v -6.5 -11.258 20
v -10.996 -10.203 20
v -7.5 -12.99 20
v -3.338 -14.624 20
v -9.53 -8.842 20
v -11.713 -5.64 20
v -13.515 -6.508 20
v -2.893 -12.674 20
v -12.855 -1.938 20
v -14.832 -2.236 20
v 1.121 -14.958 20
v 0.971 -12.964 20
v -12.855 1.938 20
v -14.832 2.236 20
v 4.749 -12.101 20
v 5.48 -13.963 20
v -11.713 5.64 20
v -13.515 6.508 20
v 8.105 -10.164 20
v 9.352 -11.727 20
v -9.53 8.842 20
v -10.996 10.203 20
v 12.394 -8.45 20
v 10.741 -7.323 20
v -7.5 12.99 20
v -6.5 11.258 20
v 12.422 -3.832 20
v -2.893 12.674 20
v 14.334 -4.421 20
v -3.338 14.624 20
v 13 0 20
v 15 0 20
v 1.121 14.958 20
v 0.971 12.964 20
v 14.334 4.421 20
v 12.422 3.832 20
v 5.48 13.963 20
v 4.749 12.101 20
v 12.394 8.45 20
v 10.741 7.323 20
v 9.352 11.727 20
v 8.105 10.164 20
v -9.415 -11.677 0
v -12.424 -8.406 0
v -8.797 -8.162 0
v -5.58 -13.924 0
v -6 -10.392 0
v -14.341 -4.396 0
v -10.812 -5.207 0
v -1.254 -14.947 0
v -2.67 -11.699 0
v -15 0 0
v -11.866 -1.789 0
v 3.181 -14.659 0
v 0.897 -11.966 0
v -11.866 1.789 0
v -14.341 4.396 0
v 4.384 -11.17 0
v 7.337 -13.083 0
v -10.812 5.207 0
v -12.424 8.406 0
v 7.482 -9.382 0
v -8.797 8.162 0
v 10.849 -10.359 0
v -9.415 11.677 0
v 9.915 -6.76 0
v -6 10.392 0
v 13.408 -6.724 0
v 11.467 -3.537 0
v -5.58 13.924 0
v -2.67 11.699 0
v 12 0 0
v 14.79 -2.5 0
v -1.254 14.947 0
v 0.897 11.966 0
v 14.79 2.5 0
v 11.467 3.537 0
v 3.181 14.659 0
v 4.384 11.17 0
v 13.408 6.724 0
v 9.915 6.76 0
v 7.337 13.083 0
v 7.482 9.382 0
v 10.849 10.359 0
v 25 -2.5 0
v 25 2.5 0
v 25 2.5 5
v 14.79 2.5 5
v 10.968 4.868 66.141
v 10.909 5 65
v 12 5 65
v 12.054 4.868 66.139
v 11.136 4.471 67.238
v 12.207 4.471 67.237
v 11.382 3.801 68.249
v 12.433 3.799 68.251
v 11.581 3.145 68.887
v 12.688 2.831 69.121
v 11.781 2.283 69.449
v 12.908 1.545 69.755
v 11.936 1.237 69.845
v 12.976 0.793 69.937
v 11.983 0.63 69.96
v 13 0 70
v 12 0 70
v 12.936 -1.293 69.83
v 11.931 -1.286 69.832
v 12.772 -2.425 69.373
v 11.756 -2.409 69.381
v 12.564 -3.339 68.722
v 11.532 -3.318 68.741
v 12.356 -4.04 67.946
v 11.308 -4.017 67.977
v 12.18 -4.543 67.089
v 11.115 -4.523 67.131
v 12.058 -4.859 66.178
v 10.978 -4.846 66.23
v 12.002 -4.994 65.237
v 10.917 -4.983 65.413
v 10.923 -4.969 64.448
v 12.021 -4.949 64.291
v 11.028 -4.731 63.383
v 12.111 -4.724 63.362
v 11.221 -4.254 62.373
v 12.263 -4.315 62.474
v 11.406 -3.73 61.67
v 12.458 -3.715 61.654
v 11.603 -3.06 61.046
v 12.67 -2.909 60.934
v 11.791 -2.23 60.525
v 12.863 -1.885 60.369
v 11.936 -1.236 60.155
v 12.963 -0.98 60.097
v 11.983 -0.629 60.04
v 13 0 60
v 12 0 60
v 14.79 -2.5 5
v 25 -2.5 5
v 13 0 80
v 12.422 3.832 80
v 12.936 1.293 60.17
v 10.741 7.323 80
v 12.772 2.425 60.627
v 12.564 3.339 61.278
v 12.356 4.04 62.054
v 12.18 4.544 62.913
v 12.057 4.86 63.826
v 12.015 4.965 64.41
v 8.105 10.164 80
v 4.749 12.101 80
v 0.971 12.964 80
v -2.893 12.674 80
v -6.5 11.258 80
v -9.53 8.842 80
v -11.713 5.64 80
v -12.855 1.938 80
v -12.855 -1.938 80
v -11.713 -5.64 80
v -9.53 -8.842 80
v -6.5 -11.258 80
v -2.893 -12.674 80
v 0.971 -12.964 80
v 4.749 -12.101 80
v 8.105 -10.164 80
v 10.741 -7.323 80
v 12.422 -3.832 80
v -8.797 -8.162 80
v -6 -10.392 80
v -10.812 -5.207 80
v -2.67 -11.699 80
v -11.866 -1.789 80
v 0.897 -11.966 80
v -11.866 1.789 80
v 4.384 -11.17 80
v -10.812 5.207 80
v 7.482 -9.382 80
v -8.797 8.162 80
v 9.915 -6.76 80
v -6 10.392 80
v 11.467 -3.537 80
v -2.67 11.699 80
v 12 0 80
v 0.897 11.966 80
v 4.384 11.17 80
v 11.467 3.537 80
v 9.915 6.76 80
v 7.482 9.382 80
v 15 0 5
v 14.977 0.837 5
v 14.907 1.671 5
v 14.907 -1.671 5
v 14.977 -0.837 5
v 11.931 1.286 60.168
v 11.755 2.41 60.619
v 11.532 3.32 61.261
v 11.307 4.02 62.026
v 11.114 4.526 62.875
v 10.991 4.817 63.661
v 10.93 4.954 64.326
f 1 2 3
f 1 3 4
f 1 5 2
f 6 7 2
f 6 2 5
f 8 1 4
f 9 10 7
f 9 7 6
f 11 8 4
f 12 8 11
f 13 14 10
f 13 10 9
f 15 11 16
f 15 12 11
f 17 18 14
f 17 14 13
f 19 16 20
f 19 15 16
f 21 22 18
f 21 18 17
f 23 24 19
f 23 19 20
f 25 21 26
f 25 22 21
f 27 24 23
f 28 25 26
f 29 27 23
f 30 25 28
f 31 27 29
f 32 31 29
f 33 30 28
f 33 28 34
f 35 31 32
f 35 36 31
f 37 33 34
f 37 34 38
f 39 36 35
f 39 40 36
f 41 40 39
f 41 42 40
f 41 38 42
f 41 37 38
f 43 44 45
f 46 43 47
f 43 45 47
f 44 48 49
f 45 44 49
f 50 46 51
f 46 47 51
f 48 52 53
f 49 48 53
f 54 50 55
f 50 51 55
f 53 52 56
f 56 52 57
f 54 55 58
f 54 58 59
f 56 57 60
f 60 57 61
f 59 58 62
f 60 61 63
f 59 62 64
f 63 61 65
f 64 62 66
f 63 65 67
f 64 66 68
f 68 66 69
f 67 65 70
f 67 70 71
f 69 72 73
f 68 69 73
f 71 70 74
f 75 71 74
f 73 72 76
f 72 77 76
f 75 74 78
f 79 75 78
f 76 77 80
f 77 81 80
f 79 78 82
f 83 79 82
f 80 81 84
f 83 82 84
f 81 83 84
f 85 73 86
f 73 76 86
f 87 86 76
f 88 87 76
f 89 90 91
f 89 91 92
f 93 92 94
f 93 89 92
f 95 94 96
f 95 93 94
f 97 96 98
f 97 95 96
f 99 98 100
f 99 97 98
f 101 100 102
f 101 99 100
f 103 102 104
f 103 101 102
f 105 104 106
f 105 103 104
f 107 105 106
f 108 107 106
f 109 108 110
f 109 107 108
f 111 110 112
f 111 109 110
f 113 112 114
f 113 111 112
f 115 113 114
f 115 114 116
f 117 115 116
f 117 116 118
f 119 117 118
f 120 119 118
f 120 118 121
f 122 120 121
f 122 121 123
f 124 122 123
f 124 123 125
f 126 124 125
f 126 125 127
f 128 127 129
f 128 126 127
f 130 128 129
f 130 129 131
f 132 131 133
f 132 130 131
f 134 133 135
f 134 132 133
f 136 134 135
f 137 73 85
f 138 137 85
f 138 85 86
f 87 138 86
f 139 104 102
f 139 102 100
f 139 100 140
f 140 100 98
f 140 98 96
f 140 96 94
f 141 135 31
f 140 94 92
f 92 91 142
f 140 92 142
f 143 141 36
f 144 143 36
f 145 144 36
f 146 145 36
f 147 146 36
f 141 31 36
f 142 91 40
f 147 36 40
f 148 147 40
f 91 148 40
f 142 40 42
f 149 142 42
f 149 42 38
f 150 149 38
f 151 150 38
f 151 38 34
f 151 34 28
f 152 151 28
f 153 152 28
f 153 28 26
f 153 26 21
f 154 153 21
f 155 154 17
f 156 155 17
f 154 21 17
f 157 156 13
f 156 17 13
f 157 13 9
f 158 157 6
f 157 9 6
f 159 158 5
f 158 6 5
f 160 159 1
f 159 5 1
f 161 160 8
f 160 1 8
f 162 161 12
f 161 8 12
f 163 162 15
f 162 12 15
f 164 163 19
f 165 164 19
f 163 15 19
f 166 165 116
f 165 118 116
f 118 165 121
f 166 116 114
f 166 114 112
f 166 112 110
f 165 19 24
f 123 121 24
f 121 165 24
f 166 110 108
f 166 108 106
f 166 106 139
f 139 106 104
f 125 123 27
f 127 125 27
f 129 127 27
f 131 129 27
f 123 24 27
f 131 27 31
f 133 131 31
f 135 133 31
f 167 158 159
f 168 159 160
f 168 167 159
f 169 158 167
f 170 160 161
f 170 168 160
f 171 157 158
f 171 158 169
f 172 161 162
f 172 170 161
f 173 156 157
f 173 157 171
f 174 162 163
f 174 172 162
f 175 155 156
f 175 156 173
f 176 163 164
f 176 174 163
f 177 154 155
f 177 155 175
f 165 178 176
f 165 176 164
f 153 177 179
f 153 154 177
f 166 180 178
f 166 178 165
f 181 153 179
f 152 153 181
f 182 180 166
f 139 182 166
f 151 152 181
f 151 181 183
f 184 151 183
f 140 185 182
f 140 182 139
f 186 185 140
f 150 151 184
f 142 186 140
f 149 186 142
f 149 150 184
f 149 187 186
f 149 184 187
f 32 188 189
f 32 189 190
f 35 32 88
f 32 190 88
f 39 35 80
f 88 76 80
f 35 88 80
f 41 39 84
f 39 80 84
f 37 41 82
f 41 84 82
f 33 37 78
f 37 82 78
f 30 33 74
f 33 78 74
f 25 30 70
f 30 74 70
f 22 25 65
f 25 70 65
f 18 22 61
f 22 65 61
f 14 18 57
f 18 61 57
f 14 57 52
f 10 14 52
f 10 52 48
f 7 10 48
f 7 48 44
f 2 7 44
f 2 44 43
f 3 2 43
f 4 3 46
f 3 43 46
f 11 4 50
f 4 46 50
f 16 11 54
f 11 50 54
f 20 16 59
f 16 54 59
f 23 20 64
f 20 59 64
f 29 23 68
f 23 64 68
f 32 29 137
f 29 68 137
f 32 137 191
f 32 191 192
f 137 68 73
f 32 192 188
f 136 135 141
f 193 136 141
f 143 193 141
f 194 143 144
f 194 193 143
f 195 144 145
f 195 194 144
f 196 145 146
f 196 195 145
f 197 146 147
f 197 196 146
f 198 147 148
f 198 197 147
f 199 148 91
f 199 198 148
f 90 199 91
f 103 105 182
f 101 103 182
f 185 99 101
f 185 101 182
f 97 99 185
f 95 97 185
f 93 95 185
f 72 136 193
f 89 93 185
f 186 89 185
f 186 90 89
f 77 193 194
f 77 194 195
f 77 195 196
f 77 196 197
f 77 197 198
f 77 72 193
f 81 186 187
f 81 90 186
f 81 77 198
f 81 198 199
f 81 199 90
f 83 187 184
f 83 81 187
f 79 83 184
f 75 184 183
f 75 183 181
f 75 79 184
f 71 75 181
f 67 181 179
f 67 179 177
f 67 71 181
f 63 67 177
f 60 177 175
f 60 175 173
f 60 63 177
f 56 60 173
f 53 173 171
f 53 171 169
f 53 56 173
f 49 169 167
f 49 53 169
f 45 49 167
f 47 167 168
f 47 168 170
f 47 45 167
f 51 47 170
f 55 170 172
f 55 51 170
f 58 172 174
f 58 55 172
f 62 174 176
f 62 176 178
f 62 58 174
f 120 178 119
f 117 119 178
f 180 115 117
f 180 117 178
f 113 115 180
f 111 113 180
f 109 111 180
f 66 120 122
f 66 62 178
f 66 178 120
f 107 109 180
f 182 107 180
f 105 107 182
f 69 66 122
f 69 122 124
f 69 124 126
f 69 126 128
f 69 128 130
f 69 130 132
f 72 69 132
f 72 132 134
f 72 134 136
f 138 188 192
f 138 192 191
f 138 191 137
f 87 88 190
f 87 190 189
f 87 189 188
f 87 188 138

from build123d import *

# Parameters (mm, degrees)
F0_R     = 15
F0_R_2   = 12
F1_DEPTH = 20
F2_R     = 13
F2_R_2   = 12
F3_DEPTH = 60
F5_DEPTH = 5
F7_DEPTH = 25


with BuildPart() as f1:
    # F0 (on Top) → F1 (new body)
    with BuildSketch(Plane.XY):
        Circle(F0_R)
        Circle(F0_R_2, mode=Mode.SUBTRACT)
    extrude(amount=F1_DEPTH)

    # F2 (on face) → F3 (join)
    with BuildSketch(Plane.XY.offset(20)):
        Circle(F2_R)
        Circle(F2_R_2, mode=Mode.SUBTRACT)
    extrude(amount=F3_DEPTH)

    # F4 (on Top) → F5 (join)
    with BuildSketch(Plane.XY):
        with BuildLine():
            Line((25, 0), (15, 0))
            ThreePointArc((15, 0), (14.9474578418, -1.2543939042), (14.7901994577, -2.5))
            Line((14.7901994577, -2.5), (25, -2.5))
            Line((25, -2.5), (25, 0))
        make_face()
        with BuildLine():
            ThreePointArc((14.7901994577, 2.5), (14.9474578418, 1.2543939042), (15, 0))
            Line((15, 0), (25, 0))
            Line((25, 0), (25, 2.5))
            Line((25, 2.5), (14.7901994577, 2.5))
        make_face()
    extrude(amount=F5_DEPTH)

    # F6 (on Right) → F7 (cut)
    with BuildSketch(Plane.YZ):
        with BuildLine():
            ThreePointArc((0, 60), (3.5355339059, 61.4644660941), (5, 65))
            ThreePointArc((5, 65), (-3.5355339059, 68.5355339059), (0, 60))
        make_face()
    extrude(amount=F7_DEPTH, mode=Mode.SUBTRACT)


solid = f1.part
